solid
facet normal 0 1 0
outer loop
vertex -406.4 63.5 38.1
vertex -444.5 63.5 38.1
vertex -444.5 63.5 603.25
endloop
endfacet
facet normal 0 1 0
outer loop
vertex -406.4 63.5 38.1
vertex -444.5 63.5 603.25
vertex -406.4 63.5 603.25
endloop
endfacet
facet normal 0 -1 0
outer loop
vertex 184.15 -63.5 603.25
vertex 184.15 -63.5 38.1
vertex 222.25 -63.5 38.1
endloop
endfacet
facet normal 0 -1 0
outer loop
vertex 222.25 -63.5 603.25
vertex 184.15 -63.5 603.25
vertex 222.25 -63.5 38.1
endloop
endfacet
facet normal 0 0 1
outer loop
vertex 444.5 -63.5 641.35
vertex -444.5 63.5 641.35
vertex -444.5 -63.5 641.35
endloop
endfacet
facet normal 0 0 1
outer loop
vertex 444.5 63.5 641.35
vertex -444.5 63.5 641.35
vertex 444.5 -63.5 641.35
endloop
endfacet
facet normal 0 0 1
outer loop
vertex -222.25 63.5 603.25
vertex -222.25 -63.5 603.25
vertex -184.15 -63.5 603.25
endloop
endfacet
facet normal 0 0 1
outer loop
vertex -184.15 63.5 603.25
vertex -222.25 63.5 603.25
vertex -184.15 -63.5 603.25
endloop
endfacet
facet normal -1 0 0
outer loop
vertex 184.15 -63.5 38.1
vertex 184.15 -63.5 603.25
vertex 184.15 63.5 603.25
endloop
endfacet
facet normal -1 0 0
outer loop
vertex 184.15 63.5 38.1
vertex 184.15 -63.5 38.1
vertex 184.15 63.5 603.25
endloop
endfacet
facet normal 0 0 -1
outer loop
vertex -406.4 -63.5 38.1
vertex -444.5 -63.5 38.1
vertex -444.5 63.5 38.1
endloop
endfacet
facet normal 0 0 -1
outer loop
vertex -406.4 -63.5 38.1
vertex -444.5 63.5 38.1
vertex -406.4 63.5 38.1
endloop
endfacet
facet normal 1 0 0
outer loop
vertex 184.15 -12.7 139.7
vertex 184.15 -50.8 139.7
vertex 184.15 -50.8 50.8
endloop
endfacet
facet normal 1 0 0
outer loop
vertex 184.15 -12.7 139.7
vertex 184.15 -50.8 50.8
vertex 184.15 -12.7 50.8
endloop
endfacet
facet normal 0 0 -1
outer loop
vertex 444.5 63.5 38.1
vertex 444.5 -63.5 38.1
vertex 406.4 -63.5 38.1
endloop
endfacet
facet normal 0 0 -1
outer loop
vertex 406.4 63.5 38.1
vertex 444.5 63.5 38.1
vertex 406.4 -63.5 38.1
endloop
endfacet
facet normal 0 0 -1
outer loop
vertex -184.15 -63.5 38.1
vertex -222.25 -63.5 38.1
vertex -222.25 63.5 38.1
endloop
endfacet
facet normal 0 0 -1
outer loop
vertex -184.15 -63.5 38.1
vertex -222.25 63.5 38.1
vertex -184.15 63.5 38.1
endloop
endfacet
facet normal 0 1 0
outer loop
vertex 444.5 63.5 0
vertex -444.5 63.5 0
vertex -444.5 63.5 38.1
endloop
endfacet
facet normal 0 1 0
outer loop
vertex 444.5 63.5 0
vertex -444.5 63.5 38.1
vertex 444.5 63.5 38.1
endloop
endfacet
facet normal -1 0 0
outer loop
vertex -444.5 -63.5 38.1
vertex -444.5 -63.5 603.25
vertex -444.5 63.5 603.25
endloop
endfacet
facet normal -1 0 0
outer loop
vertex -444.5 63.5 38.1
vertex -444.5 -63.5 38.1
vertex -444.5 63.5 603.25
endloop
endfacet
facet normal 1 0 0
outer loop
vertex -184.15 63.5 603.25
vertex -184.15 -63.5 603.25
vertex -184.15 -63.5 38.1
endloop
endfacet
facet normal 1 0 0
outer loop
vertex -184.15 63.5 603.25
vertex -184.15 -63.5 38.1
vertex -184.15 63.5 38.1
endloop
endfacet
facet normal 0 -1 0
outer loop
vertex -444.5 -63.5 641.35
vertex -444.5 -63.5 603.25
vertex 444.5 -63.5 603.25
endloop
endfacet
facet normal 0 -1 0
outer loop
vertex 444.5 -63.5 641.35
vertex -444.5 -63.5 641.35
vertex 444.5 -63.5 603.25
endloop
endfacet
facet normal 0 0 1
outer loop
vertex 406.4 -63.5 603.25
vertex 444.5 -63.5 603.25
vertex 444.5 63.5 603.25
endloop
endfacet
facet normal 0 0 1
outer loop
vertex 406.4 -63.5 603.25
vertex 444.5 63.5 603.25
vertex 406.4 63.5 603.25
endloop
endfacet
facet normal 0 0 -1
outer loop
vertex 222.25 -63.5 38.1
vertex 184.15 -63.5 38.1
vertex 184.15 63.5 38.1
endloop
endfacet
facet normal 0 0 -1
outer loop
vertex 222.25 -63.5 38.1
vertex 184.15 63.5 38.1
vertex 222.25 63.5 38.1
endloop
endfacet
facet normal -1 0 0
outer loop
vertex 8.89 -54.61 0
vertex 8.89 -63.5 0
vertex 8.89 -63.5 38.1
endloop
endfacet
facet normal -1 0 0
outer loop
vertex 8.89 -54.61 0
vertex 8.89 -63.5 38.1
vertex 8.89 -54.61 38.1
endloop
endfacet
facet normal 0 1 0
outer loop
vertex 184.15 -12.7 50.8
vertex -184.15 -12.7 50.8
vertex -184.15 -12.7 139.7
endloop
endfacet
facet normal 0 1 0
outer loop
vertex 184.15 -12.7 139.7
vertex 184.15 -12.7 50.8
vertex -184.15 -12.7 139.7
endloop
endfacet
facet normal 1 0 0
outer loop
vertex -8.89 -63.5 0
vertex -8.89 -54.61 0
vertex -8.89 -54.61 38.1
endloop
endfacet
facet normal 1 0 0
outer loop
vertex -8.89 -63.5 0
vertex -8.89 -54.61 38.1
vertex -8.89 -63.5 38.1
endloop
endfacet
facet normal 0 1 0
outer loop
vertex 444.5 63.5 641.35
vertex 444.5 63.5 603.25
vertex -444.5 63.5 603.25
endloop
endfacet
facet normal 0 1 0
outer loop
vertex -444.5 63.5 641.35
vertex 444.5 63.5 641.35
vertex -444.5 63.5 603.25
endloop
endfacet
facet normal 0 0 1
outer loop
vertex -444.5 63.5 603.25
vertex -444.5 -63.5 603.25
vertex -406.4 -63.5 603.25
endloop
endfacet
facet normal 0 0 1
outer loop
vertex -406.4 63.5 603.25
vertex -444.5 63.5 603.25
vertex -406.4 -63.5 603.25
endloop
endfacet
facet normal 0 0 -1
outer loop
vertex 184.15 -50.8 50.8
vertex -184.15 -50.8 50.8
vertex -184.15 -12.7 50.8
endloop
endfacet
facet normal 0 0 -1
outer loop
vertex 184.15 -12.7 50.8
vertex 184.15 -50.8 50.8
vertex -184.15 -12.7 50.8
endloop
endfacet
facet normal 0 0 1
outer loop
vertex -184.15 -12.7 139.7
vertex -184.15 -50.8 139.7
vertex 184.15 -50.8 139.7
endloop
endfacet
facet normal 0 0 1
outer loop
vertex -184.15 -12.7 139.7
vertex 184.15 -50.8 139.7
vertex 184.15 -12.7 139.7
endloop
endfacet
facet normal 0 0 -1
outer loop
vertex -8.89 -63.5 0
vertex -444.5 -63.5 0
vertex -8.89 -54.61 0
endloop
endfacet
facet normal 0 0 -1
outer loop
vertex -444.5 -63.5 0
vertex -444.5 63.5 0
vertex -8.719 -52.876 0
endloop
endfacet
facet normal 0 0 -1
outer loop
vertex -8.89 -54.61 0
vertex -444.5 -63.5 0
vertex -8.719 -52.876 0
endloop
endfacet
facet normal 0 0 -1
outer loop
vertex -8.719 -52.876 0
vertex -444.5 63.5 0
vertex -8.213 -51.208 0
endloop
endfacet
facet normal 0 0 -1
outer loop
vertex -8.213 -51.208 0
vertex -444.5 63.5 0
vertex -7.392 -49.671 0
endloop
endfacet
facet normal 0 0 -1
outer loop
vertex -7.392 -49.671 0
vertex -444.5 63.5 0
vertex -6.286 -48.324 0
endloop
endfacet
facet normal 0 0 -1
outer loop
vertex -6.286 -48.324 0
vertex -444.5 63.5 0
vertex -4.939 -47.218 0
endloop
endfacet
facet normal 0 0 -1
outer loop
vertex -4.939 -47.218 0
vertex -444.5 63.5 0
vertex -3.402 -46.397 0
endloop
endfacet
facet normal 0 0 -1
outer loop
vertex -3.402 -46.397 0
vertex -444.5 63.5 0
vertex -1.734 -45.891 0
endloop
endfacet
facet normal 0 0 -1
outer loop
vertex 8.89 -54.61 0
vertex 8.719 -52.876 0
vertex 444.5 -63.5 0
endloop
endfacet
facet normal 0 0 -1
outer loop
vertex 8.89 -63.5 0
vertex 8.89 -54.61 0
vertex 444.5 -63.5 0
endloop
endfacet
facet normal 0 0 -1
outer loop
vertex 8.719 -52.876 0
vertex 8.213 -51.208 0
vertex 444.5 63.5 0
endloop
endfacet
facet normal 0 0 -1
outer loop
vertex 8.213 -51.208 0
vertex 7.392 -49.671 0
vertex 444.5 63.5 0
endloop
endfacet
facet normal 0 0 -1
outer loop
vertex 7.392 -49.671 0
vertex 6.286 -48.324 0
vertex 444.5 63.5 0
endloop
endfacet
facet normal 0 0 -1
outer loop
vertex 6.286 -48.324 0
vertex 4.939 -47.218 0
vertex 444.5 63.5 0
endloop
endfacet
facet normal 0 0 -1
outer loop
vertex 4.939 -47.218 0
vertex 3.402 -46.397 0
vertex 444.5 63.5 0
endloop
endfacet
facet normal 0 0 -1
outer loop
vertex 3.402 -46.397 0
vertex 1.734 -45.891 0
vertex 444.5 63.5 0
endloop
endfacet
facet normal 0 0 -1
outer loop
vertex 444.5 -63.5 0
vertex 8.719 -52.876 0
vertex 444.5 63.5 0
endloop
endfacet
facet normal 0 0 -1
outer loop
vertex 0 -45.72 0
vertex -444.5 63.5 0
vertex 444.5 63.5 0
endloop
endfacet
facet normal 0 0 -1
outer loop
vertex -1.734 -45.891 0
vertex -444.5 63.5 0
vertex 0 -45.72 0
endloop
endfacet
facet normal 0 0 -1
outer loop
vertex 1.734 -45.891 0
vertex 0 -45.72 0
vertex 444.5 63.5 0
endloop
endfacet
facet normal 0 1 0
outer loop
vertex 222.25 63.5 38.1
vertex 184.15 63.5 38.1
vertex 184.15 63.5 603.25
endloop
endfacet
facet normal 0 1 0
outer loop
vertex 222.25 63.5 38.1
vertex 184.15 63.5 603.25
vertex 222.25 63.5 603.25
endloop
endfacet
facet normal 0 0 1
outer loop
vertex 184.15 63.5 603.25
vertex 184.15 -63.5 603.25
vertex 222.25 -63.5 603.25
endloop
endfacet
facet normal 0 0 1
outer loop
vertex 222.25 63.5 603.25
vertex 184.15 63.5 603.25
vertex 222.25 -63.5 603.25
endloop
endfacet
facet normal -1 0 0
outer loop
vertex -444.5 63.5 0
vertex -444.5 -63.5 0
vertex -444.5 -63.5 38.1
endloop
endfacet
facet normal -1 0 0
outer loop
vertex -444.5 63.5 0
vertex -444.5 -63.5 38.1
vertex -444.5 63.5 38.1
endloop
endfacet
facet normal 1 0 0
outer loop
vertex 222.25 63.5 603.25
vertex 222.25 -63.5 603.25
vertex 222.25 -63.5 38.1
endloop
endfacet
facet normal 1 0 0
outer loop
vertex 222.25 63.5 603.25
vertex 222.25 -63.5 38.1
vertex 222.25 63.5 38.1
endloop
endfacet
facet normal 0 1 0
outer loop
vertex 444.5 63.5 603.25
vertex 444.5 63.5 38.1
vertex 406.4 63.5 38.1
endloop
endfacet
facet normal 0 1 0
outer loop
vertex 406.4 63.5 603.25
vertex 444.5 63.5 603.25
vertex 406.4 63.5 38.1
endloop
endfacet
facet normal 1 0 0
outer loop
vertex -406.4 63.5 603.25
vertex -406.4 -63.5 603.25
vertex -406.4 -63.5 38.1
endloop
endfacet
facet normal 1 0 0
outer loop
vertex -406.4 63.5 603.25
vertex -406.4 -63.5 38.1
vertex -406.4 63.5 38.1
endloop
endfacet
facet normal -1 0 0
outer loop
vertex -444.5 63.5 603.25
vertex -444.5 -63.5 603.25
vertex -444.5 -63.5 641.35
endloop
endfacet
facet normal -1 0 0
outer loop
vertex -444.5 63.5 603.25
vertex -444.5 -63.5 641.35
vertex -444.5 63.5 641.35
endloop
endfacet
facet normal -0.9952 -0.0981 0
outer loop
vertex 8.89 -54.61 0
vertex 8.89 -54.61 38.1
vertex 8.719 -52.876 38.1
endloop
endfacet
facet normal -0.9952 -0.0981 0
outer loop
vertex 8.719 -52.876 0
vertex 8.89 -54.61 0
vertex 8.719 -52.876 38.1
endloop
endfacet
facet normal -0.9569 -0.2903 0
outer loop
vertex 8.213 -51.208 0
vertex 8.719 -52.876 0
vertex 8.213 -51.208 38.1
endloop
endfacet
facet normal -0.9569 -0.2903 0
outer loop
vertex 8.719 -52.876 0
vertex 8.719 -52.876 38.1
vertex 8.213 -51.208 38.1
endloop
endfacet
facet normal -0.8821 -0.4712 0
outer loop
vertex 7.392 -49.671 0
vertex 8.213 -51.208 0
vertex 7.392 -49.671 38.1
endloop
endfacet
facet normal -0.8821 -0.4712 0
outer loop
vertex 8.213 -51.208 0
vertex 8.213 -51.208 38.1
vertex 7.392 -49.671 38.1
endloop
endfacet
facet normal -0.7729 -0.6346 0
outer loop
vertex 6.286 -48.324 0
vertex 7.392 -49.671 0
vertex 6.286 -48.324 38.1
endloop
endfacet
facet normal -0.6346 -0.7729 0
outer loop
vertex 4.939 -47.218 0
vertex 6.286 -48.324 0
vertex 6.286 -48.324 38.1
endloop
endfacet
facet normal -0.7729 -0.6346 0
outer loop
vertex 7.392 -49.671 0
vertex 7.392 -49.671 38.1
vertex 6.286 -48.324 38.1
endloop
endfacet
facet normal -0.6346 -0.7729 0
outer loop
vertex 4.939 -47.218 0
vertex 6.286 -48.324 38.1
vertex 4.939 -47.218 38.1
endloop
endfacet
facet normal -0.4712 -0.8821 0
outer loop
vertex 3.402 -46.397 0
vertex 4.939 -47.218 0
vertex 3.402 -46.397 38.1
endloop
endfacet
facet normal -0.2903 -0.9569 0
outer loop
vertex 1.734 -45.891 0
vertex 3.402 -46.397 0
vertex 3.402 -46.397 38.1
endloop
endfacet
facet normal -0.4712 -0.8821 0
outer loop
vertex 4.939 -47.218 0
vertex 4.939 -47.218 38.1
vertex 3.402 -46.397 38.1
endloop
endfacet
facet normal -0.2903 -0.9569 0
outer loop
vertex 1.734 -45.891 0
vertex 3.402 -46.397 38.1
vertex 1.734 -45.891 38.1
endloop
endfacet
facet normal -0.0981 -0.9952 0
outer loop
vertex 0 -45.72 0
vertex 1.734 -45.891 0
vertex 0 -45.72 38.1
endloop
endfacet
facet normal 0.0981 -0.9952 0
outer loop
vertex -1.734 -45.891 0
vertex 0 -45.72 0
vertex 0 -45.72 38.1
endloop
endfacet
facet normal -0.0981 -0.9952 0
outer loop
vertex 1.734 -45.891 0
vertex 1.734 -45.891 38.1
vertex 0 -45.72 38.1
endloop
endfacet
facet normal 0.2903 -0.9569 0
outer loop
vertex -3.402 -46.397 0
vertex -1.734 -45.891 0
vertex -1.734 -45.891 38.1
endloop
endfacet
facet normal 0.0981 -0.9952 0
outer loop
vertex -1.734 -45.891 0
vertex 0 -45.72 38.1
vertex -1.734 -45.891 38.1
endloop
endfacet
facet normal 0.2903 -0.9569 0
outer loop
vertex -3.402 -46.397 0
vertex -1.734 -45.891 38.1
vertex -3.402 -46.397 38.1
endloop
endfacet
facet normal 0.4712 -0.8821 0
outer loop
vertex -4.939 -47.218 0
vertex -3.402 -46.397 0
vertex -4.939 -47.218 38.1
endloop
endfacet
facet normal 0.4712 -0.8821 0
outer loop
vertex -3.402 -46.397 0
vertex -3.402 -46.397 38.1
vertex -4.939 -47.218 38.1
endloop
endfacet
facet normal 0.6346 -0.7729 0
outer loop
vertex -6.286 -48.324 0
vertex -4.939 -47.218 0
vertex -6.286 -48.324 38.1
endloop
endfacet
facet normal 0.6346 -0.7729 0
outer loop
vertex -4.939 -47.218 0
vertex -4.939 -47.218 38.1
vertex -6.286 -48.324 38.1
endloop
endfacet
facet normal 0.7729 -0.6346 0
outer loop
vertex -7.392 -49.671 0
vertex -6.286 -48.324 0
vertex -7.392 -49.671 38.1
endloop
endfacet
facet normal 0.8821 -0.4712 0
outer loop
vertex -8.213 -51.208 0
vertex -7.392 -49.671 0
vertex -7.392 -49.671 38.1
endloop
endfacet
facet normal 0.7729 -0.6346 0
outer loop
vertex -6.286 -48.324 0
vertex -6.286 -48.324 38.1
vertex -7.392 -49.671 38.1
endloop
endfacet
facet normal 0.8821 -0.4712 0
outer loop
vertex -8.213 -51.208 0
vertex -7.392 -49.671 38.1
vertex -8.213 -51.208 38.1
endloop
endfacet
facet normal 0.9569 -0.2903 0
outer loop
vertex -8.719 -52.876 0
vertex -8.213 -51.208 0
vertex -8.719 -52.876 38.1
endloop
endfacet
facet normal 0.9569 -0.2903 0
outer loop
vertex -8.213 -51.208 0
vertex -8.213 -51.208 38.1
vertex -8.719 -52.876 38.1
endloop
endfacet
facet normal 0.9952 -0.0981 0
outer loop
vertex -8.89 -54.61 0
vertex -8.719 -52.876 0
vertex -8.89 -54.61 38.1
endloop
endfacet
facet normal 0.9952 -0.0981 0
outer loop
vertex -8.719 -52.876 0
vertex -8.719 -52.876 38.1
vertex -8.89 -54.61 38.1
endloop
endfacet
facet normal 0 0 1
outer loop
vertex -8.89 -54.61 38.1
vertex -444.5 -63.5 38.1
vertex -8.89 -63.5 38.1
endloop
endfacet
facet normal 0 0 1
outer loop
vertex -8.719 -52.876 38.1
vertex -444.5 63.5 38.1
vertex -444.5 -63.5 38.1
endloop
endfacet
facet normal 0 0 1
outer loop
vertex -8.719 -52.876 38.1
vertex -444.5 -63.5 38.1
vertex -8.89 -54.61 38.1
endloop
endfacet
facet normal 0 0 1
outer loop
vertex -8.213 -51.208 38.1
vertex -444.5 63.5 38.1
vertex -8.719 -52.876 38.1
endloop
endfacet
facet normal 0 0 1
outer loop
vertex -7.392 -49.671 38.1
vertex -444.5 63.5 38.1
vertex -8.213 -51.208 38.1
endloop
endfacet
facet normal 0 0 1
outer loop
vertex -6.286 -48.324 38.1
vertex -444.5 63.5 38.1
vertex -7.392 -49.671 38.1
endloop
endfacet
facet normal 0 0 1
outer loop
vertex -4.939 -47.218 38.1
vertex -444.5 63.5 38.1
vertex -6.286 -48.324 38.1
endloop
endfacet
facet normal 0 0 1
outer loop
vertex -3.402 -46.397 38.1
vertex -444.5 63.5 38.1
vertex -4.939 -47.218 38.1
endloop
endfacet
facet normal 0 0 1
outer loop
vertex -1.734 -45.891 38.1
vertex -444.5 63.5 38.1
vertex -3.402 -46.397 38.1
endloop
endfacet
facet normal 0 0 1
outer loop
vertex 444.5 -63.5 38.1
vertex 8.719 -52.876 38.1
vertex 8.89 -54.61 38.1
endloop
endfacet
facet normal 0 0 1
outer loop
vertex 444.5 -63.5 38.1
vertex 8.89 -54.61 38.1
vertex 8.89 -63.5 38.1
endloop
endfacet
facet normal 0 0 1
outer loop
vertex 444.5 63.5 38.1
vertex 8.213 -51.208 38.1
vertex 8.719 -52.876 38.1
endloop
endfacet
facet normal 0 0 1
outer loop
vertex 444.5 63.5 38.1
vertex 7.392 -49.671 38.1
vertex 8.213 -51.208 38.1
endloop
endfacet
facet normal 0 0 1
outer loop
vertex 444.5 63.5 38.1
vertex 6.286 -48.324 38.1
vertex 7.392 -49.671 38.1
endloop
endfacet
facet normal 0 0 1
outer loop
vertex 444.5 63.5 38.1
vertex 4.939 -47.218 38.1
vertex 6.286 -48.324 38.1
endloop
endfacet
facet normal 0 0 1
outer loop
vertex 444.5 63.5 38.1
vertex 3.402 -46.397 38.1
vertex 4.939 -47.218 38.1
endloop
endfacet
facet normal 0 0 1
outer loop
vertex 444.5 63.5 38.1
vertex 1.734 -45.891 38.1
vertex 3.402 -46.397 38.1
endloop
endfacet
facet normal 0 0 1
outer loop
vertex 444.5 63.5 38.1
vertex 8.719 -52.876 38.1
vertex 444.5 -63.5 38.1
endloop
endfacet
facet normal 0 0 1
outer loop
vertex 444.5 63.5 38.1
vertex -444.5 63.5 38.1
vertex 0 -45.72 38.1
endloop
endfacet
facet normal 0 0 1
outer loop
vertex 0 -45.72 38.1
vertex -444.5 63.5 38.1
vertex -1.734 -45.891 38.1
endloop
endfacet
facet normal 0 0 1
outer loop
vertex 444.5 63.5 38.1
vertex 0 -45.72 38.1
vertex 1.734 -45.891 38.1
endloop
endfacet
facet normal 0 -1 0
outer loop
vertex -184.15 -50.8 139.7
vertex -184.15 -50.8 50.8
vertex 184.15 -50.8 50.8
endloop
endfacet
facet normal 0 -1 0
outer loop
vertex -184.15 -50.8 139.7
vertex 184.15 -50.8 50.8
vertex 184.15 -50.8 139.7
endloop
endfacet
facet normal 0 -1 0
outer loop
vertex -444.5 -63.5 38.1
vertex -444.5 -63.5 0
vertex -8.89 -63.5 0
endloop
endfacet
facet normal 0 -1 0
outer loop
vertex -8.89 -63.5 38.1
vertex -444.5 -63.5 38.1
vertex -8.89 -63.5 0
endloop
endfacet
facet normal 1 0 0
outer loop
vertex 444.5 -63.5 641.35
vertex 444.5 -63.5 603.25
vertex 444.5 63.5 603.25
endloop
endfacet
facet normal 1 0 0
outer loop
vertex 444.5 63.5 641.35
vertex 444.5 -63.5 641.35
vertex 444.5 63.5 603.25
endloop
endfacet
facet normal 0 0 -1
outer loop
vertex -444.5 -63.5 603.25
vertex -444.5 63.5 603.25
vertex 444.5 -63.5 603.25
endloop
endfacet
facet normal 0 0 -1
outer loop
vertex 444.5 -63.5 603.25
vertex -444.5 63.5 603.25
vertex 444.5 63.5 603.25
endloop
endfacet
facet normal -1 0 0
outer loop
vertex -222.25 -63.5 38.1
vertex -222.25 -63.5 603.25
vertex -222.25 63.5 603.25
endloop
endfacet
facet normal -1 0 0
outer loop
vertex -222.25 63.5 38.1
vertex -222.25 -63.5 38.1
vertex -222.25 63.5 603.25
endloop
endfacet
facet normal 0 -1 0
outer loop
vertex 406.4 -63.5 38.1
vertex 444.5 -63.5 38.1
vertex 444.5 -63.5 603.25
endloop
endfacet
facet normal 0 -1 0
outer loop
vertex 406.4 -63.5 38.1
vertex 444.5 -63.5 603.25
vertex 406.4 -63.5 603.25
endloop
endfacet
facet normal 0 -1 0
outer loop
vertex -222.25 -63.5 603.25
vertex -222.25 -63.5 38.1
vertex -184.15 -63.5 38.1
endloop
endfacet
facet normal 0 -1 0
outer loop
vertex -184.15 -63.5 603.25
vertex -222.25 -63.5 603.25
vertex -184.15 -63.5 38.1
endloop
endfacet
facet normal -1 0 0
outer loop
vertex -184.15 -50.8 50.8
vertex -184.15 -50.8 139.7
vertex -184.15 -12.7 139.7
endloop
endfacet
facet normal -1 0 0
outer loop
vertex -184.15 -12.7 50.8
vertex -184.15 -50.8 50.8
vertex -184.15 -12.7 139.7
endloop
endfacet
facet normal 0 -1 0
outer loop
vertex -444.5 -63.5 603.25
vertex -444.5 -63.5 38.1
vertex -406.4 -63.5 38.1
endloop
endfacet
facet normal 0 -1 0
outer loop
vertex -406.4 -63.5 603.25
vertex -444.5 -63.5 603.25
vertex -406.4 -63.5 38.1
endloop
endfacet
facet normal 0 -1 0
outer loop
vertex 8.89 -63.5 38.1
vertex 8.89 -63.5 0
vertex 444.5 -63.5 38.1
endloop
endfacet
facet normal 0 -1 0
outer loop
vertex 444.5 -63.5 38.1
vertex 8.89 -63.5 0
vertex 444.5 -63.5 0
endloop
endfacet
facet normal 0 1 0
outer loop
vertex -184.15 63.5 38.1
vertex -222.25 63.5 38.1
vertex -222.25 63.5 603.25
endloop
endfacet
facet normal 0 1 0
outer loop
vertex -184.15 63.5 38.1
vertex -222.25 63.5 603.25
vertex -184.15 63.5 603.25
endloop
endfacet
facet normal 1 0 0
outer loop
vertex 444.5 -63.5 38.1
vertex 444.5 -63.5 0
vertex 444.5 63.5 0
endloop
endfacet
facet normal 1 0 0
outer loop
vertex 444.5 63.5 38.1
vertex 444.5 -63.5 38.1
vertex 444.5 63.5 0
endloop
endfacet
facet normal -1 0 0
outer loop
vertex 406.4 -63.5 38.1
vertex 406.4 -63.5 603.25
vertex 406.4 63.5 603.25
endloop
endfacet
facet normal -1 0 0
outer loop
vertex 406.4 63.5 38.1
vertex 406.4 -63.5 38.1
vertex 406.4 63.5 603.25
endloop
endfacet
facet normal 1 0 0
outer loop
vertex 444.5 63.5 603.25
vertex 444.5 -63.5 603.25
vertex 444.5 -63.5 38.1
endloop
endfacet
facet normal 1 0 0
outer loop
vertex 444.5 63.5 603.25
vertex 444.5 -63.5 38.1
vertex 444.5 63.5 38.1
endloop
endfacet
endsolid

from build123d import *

# Parameters (mm, degrees)
F0_W      = 889
F0_H      = 127
F1_DEPTH  = 38.1
F2_W      = 38.1
F2_H      = 127
F3_DEPTH  = 565.15
F5_W      = 850.9
F5_H      = 127
F5_W_2    = 38.1
F6_DEPTH  = 38.1
F7_W      = 38.1
F7_H      = 127
F8_DEPTH  = 565.15
F9_W      = 38.1
F9_H      = 88.9
F10_DEPTH = 368.3
F12_DEPTH = 38.1


with BuildPart() as f1:
    # F0 (on Top) → F1 (new body)
    with BuildSketch(Plane.XY):
        Rectangle(F0_W, F0_H)
    extrude(amount=F1_DEPTH)

    # F11 (on face) → F12 (cut, through all)
    with BuildSketch(Plane.XY.offset(38.1)):
        with BuildLine():
            Line((8.89, -63.5), (8.89, -54.61))
            ThreePointArc((8.89, -54.61), (0, -45.72), (-8.89, -54.61))
            Line((-8.89, -54.61), (-8.89, -63.5))
            Line((-8.89, -63.5), (8.89, -63.5))
        make_face()
    extrude(amount=-F12_DEPTH, mode=Mode.SUBTRACT)


with BuildPart() as f3:
    # F2 (on face) → F3 (new body)
    with BuildSketch(Plane.XY.offset(38.1)):
        with Locations((-425.45, 0)):
            Rectangle(F2_W, F2_H)
    extrude(amount=F3_DEPTH)


with BuildPart() as f4_1:
    # F4: instance of F3
    add(f3.part.mirror(Plane.YZ))


with BuildPart() as f6:
    # F5 (on face) → F6 (new body)
    with BuildSketch(Plane.XY.offset(603.25)):
        with Locations((19.05, 0)):
            Rectangle(F5_W, F5_H)
        with Locations((-425.45, 0)):
            Rectangle(F5_W_2, F5_H)
    extrude(amount=F6_DEPTH)


with BuildPart() as f8:
    # F7 (on face) → F8 (new body, through all)
    with BuildSketch(Plane.XY.offset(38.1)):
        with Locations((-203.2, 0)):
            Rectangle(F7_W, F7_H)
        with Locations((203.2, 0)):
            Rectangle(F7_W, F7_H)
    extrude(amount=F8_DEPTH)


with BuildPart() as f10:
    # F9 (on face) → F10 (new body, through all)
    with BuildSketch(Plane.YZ.offset(-184.15)):
        with Locations((-31.75, 95.25)):
            Rectangle(F9_W, F9_H)
    extrude(amount=F10_DEPTH)


solid = Compound([f1.part, f3.part, f4_1.part, f6.part, f8.part, f10.part])
